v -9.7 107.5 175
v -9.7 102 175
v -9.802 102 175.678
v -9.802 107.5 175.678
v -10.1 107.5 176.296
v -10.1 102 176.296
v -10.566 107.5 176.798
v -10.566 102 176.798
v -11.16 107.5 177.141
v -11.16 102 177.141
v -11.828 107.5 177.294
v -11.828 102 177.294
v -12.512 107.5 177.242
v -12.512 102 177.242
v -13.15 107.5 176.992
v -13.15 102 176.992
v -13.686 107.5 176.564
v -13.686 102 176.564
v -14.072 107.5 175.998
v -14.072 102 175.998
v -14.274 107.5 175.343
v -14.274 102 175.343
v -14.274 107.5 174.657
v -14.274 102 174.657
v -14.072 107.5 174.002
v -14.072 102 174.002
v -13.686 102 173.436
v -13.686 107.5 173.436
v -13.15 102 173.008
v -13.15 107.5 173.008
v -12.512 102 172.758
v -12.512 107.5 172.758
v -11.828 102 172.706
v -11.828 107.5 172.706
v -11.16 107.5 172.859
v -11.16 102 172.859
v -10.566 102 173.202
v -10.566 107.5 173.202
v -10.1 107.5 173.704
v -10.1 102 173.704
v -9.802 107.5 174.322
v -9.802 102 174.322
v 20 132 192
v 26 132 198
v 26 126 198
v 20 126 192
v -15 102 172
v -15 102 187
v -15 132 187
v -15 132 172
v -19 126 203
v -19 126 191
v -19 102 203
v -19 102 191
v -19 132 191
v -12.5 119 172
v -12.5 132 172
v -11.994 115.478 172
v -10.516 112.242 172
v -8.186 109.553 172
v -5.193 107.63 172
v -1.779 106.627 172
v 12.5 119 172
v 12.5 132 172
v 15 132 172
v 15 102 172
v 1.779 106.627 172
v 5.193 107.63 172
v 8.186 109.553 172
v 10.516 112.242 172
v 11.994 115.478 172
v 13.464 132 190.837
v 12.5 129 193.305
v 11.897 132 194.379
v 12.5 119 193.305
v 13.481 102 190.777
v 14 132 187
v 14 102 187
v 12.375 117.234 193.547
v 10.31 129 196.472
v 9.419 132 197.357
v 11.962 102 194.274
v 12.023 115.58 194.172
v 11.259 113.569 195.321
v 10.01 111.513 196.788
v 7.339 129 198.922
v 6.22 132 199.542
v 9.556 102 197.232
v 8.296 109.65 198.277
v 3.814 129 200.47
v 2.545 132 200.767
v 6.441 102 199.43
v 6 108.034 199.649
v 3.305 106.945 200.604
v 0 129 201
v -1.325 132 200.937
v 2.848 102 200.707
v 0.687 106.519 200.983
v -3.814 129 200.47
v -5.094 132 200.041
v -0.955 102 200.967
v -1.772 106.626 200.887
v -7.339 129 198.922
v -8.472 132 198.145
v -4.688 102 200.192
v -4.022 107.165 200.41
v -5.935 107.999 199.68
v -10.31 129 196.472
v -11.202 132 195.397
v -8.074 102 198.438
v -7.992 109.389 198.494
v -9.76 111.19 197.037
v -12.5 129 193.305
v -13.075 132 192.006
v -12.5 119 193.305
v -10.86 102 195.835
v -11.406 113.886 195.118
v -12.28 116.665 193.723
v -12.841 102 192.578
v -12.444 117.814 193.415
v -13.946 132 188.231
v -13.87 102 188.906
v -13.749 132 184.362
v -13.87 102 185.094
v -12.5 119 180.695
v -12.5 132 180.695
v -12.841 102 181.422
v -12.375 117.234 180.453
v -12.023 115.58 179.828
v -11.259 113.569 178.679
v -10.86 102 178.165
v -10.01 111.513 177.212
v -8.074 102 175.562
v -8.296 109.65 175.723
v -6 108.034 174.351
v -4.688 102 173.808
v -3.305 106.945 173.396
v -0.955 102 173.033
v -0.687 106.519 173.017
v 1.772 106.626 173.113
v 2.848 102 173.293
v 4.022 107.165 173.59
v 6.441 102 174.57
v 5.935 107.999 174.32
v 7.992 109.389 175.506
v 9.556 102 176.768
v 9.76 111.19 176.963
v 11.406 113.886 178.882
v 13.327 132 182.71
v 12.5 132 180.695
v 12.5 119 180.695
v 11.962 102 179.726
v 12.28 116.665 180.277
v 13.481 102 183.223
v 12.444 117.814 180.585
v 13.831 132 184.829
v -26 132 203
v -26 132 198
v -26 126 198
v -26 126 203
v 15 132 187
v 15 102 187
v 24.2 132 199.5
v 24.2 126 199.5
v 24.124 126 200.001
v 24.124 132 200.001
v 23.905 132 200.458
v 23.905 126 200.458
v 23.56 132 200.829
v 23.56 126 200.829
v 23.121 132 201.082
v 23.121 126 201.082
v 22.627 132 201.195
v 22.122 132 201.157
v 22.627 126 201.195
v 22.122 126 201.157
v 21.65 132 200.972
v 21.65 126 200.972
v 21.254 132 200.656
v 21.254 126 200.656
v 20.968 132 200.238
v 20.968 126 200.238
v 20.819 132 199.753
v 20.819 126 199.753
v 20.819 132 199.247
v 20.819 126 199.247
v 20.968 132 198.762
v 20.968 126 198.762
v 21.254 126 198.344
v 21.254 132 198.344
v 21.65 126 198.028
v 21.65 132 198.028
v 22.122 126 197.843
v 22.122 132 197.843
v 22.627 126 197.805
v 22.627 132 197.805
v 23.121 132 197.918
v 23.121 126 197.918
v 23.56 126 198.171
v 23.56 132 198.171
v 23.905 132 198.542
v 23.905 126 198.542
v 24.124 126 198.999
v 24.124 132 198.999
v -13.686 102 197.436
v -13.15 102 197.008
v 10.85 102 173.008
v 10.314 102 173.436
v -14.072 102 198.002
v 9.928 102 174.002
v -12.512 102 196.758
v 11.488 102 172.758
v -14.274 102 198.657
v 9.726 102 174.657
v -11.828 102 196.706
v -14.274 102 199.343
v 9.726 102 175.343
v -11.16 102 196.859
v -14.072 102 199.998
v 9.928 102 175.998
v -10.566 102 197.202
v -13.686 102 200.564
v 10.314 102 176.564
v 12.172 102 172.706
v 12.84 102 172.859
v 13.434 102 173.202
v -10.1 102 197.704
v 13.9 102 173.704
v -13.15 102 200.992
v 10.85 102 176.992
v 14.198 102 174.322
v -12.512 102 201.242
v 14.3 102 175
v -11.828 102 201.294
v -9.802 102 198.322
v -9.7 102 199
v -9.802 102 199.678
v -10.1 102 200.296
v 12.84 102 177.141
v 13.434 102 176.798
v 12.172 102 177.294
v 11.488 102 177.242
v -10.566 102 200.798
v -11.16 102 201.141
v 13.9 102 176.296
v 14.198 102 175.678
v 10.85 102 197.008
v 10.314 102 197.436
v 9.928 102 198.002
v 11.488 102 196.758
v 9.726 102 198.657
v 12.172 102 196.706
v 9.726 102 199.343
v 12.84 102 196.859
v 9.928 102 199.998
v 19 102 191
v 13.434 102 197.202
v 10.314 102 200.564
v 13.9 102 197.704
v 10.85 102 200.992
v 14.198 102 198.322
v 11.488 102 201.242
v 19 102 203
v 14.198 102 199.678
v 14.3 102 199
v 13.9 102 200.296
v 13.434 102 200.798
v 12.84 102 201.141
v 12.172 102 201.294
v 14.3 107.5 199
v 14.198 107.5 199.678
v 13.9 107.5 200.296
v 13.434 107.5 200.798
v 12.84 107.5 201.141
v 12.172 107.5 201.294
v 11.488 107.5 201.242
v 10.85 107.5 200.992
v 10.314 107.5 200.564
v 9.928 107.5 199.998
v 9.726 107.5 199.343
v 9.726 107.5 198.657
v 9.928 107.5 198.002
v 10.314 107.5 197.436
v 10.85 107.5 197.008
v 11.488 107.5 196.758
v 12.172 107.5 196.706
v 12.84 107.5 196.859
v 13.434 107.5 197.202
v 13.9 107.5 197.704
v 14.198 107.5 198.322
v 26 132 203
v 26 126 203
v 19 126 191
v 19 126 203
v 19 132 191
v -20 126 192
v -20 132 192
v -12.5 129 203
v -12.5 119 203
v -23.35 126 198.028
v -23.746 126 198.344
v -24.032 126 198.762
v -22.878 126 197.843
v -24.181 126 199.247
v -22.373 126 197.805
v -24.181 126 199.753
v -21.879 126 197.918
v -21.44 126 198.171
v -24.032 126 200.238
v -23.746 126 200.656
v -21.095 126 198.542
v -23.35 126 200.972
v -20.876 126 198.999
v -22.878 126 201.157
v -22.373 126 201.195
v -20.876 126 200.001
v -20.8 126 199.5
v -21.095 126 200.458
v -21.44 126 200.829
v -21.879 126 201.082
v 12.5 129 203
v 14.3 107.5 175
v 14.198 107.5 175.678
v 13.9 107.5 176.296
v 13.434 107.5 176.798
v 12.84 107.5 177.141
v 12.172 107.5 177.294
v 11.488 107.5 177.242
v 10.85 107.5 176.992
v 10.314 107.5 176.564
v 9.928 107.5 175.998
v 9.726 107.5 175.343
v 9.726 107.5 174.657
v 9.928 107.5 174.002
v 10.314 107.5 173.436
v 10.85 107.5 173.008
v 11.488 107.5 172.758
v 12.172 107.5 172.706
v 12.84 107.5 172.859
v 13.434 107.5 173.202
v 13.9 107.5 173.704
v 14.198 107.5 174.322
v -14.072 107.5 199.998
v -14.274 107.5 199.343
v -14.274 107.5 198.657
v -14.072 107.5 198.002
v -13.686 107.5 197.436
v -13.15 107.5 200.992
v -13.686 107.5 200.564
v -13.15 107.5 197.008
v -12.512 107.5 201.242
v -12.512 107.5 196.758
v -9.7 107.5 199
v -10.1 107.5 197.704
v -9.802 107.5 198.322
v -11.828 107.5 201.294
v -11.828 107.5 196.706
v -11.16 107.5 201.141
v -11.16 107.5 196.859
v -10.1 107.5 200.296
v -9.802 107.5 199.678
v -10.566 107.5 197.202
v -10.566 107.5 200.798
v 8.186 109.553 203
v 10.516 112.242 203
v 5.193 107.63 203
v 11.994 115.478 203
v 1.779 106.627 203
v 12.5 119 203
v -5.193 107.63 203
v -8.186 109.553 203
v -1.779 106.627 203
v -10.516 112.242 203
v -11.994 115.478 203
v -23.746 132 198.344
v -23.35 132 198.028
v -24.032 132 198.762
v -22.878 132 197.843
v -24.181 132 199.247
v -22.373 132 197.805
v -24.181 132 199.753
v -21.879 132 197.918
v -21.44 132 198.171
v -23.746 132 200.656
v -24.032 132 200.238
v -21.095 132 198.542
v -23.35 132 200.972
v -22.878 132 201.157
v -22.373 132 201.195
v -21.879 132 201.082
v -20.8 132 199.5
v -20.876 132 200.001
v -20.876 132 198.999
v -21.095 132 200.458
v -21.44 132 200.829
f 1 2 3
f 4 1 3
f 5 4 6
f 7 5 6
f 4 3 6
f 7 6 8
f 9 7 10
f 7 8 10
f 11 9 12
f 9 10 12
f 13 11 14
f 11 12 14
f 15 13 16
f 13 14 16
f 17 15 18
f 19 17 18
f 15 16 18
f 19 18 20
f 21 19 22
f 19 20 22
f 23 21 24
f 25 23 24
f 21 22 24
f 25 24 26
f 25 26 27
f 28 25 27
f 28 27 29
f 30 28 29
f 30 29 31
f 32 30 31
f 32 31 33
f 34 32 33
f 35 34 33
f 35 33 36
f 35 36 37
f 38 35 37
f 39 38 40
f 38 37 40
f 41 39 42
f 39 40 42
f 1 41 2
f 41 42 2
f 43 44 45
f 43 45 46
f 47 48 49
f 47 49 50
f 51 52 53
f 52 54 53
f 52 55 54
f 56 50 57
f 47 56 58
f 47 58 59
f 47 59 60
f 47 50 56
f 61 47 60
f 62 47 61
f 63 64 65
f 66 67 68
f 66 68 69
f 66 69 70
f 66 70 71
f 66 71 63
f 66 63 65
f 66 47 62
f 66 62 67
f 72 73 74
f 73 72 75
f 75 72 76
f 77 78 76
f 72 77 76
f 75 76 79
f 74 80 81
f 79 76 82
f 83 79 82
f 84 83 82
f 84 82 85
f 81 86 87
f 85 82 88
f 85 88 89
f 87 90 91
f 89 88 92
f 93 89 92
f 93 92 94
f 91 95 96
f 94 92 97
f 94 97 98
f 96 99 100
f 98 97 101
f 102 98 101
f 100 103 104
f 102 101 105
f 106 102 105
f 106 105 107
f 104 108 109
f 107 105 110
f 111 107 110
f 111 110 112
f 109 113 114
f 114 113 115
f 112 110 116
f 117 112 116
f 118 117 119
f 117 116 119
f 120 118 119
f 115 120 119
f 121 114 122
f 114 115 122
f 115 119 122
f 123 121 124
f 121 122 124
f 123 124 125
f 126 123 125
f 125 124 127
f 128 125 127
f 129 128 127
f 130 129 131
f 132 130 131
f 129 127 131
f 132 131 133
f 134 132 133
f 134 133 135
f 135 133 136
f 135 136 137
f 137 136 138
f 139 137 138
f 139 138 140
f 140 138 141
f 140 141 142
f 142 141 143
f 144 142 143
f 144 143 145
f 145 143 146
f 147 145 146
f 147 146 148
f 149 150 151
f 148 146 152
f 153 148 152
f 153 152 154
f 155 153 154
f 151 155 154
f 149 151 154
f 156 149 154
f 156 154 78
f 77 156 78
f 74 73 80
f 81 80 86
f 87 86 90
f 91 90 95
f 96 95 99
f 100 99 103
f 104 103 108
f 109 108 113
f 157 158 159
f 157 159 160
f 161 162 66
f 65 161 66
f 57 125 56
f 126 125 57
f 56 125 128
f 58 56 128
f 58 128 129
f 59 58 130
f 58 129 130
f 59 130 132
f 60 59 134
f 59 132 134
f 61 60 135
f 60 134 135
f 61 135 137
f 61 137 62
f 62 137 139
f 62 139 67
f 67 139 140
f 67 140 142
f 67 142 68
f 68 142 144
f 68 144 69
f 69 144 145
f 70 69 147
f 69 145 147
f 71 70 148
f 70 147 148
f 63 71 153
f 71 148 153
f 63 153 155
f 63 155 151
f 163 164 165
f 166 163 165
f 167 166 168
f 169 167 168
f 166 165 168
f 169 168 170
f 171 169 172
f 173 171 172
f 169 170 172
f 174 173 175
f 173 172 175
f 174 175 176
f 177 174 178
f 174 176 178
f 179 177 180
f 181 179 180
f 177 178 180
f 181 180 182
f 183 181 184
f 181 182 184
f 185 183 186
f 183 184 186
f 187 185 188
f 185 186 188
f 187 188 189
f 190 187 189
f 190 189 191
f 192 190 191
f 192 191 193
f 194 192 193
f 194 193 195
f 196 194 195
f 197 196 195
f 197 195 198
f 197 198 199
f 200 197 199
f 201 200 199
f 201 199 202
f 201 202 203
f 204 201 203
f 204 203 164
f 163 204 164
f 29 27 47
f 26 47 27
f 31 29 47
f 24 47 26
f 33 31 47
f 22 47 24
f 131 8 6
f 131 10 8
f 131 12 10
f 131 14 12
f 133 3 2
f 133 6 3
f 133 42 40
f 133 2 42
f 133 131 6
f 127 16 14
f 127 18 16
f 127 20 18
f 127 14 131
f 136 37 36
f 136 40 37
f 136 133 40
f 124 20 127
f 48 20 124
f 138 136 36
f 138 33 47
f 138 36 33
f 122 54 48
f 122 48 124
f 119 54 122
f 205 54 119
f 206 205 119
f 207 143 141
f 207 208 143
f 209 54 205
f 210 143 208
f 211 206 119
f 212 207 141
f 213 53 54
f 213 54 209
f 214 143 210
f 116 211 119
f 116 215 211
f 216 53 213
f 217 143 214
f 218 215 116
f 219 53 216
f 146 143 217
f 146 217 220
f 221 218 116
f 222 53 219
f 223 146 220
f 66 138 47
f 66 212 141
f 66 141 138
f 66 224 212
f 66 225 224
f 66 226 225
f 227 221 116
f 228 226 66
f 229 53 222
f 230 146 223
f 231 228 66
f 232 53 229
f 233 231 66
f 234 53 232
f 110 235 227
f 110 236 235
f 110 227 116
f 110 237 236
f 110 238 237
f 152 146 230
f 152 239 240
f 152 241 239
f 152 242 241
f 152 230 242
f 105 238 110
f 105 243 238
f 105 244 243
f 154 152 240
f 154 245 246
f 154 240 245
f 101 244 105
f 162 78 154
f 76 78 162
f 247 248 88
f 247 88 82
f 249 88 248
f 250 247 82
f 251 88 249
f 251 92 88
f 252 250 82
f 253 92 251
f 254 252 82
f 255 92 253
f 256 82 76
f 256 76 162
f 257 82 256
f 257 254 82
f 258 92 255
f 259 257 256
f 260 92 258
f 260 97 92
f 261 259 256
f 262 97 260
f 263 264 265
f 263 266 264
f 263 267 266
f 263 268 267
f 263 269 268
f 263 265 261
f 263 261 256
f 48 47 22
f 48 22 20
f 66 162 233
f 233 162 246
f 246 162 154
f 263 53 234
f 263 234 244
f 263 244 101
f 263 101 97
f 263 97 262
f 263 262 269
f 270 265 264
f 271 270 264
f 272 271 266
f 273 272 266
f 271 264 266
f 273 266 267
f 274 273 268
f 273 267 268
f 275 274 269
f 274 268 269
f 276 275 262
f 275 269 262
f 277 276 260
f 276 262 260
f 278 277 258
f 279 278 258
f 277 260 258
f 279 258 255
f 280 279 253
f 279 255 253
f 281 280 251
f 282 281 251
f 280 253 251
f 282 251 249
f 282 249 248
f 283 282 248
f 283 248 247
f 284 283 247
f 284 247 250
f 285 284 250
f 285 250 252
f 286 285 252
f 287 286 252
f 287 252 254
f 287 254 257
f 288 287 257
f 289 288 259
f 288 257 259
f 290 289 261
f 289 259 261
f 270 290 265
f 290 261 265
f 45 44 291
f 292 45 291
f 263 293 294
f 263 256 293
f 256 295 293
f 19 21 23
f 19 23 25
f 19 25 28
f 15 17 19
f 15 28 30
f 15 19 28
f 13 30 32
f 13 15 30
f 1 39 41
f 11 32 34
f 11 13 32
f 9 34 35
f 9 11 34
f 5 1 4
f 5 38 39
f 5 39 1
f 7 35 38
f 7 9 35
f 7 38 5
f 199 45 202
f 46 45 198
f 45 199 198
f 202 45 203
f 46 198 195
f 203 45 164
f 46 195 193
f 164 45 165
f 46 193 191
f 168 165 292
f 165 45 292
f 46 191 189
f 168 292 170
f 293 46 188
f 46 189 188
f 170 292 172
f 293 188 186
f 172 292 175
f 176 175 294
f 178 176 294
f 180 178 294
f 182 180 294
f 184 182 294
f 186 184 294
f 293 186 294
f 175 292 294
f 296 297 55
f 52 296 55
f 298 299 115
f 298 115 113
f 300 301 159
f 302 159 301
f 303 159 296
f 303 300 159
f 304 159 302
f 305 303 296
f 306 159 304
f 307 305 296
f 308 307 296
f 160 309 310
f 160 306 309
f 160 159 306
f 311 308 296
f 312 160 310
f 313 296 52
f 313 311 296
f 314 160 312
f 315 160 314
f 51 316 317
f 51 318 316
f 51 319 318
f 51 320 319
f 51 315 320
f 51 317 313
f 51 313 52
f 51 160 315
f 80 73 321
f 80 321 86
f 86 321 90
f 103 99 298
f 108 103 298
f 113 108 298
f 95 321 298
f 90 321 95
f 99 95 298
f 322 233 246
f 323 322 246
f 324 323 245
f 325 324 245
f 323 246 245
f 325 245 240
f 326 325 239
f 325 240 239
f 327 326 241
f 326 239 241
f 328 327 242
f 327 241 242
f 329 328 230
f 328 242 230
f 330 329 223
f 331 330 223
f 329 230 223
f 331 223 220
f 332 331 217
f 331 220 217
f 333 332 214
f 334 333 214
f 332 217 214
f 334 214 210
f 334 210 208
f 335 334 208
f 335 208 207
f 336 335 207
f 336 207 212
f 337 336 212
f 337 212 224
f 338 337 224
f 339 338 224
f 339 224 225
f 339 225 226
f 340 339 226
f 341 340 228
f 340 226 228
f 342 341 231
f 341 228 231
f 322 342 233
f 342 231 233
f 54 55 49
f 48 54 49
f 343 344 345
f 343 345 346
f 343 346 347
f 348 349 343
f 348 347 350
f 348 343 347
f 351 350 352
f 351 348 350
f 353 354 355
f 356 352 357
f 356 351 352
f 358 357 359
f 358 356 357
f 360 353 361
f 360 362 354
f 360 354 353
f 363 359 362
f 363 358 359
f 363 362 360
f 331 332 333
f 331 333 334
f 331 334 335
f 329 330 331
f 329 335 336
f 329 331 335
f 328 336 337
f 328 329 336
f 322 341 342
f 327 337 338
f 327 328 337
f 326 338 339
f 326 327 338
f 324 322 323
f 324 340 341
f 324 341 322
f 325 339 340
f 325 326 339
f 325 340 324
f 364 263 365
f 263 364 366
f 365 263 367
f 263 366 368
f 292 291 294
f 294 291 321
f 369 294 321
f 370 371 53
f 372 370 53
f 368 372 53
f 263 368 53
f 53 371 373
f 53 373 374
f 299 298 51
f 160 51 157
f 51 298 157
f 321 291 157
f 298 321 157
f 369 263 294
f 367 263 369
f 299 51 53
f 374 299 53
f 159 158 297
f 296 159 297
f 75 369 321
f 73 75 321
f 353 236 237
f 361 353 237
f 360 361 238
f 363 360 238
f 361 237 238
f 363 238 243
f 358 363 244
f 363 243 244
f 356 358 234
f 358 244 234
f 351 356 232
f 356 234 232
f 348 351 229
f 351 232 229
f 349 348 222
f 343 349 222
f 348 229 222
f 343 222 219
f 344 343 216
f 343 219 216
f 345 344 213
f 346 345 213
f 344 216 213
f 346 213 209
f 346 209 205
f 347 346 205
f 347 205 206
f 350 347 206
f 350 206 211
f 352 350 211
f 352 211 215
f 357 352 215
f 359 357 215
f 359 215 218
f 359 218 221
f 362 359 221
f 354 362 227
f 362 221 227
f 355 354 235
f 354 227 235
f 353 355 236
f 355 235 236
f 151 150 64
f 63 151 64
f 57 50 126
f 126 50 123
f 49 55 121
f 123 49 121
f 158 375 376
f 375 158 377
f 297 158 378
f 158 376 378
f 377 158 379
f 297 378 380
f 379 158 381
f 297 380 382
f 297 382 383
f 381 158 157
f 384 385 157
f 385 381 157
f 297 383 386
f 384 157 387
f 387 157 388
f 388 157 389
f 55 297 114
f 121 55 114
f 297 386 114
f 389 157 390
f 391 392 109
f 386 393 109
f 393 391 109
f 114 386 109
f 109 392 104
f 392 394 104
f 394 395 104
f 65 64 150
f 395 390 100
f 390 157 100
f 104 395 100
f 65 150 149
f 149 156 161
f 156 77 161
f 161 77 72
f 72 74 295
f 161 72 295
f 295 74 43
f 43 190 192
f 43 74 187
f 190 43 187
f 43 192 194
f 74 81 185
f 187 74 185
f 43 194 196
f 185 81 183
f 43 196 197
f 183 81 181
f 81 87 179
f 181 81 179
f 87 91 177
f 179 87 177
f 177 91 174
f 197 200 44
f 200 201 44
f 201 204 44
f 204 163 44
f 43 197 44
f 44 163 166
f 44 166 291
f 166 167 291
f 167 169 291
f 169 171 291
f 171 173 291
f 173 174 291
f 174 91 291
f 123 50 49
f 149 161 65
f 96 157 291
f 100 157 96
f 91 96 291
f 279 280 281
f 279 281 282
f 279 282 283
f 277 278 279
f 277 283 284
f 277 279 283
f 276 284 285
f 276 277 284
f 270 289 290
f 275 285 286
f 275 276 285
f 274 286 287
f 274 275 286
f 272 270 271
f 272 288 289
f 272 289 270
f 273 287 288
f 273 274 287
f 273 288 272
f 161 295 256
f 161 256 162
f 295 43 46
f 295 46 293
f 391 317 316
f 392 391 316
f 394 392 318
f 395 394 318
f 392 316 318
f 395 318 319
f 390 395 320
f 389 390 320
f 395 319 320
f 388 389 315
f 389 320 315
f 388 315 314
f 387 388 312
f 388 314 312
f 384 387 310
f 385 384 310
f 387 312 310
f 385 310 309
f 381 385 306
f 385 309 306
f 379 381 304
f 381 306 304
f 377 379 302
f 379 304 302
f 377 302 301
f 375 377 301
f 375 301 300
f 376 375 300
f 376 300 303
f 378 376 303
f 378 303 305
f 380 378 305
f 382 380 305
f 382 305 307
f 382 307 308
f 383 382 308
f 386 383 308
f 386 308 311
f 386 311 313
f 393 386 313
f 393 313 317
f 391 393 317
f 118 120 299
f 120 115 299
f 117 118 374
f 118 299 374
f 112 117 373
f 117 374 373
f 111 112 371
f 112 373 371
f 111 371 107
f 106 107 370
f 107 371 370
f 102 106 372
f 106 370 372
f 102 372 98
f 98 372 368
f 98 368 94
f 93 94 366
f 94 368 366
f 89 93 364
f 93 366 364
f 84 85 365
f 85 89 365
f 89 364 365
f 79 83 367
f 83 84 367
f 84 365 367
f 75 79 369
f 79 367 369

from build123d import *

# Parameters (mm, degrees)
SKETCH088_W     = 38
SKETCH088_H     = 31
PAD029_DEPTH    = 30
POCKET029_DEPTH = 31.001
SKETCH100_R     = 14
POCKET030_DEPTH = 30.001
SKETCH101_W     = 25
SKETCH101_H     = 10
POCKET031_DEPTH = 3
SKETCH102_R     = 2.3
POCKET032_DEPTH = 5.5
SKETCH103_W     = 6
SKETCH103_H     = 31
PAD035_DEPTH    = 6
POCKET033_DEPTH = 30.001
PAD037_DEPTH    = 6
SKETCH107_R     = 1.7
HOLE020_DEPTH   = 25


with BuildPart() as part:
    # Sketch088 → Pad029 (new body)
    with BuildSketch(Plane.XZ.offset(3)):
        with Locations((0, 187.5)):
            Rectangle(SKETCH088_W, SKETCH088_H)
    extrude(amount=-PAD029_DEPTH)

    # Sketch099 (on Face4 of Pad029) → Pocket029 (cut, through all)
    with BuildSketch(Plane(origin=(0, 0, 203), x_dir=(-1, 0, 0), z_dir=(0, 0, 1))):
        with BuildLine():
            Line((-12.5, -14), (-12.5, -24))
            Line((-12.5, -24), (12.5, -24))
            Line((12.5, -14), (12.5, -24))
            ThreePointArc((12.5, -14), (0, -1.5), (-12.5, -14))
        make_face()
    extrude(amount=-POCKET029_DEPTH, mode=Mode.SUBTRACT)

    # Sketch100 (on Face4 of Pocket029) → Pocket030 (cut, through all)
    with BuildSketch(Plane.XZ.offset(3)):
        with Locations((0, 187)):
            Circle(SKETCH100_R)
    extrude(amount=-POCKET030_DEPTH, mode=Mode.SUBTRACT)

    # Sketch101 (on Face5 of Pocket030) → Pocket031 (cut)
    with BuildSketch(Plane(origin=(0, 27, 0), x_dir=(1, 0, 0), z_dir=(0, 1, 0))):
        with Locations((0, -177)):
            Rectangle(SKETCH101_W, SKETCH101_H)
    extrude(amount=-POCKET031_DEPTH, mode=Mode.SUBTRACT)

    # Sketch102 (on Face4 of Pocket031) → Pocket032 (cut)
    with BuildSketch(Plane.XZ.offset(3)):
        with Locations((-12, 199)):
            Circle(SKETCH102_R)
        with Locations((-12, 175)):
            Circle(SKETCH102_R)
        with Locations((12, 175)):
            Circle(SKETCH102_R)
        with Locations((12, 199)):
            Circle(SKETCH102_R)
    extrude(amount=-POCKET032_DEPTH, mode=Mode.SUBTRACT)

    # Sketch103 → Pad035 (join)
    with BuildSketch(Plane.XZ.offset(-27)):
        with Locations((-23, 187.5)):
            Rectangle(SKETCH103_W, SKETCH103_H)
        with Locations((23, 187.5)):
            Rectangle(SKETCH103_W, SKETCH103_H)
    extrude(amount=PAD035_DEPTH)

    # Sketch104 → Pocket033 (cut, through all)
    with BuildSketch(Plane.XZ.offset(-27)):
        Polygon((-26, 197.999996), (-15, 187), (-15, 172), (-26, 172), align=None)
        Polygon((26, 197.999996), (15, 187), (15, 172), (26, 172), align=None)
    extrude(amount=POCKET033_DEPTH, mode=Mode.SUBTRACT)

    # Sketch106 → Pad037 (join)
    with BuildSketch(Plane.XZ.offset(-27)):
        Polygon((-19, 203), (-26, 203), (-26, 198), (-19, 191), align=None)
        Polygon((19, 203), (26, 203), (26, 198), (19, 191), align=None)
    extrude(amount=PAD037_DEPTH)

    # Sketch107 (on Face4 of Pad037) → Hole020 (cut)
    with BuildSketch(Plane.XZ.offset(-21)):
        with Locations((-22.5, 199.5)):
            Circle(SKETCH107_R)
        with Locations((22.5, 199.5)):
            Circle(SKETCH107_R)
    extrude(amount=-HOLE020_DEPTH, mode=Mode.SUBTRACT)


with BuildPart() as part_1:
    # Body012 placement: moved
    add(part.part.moved(Location((0, 105, 0))))


solid = part_1.part
